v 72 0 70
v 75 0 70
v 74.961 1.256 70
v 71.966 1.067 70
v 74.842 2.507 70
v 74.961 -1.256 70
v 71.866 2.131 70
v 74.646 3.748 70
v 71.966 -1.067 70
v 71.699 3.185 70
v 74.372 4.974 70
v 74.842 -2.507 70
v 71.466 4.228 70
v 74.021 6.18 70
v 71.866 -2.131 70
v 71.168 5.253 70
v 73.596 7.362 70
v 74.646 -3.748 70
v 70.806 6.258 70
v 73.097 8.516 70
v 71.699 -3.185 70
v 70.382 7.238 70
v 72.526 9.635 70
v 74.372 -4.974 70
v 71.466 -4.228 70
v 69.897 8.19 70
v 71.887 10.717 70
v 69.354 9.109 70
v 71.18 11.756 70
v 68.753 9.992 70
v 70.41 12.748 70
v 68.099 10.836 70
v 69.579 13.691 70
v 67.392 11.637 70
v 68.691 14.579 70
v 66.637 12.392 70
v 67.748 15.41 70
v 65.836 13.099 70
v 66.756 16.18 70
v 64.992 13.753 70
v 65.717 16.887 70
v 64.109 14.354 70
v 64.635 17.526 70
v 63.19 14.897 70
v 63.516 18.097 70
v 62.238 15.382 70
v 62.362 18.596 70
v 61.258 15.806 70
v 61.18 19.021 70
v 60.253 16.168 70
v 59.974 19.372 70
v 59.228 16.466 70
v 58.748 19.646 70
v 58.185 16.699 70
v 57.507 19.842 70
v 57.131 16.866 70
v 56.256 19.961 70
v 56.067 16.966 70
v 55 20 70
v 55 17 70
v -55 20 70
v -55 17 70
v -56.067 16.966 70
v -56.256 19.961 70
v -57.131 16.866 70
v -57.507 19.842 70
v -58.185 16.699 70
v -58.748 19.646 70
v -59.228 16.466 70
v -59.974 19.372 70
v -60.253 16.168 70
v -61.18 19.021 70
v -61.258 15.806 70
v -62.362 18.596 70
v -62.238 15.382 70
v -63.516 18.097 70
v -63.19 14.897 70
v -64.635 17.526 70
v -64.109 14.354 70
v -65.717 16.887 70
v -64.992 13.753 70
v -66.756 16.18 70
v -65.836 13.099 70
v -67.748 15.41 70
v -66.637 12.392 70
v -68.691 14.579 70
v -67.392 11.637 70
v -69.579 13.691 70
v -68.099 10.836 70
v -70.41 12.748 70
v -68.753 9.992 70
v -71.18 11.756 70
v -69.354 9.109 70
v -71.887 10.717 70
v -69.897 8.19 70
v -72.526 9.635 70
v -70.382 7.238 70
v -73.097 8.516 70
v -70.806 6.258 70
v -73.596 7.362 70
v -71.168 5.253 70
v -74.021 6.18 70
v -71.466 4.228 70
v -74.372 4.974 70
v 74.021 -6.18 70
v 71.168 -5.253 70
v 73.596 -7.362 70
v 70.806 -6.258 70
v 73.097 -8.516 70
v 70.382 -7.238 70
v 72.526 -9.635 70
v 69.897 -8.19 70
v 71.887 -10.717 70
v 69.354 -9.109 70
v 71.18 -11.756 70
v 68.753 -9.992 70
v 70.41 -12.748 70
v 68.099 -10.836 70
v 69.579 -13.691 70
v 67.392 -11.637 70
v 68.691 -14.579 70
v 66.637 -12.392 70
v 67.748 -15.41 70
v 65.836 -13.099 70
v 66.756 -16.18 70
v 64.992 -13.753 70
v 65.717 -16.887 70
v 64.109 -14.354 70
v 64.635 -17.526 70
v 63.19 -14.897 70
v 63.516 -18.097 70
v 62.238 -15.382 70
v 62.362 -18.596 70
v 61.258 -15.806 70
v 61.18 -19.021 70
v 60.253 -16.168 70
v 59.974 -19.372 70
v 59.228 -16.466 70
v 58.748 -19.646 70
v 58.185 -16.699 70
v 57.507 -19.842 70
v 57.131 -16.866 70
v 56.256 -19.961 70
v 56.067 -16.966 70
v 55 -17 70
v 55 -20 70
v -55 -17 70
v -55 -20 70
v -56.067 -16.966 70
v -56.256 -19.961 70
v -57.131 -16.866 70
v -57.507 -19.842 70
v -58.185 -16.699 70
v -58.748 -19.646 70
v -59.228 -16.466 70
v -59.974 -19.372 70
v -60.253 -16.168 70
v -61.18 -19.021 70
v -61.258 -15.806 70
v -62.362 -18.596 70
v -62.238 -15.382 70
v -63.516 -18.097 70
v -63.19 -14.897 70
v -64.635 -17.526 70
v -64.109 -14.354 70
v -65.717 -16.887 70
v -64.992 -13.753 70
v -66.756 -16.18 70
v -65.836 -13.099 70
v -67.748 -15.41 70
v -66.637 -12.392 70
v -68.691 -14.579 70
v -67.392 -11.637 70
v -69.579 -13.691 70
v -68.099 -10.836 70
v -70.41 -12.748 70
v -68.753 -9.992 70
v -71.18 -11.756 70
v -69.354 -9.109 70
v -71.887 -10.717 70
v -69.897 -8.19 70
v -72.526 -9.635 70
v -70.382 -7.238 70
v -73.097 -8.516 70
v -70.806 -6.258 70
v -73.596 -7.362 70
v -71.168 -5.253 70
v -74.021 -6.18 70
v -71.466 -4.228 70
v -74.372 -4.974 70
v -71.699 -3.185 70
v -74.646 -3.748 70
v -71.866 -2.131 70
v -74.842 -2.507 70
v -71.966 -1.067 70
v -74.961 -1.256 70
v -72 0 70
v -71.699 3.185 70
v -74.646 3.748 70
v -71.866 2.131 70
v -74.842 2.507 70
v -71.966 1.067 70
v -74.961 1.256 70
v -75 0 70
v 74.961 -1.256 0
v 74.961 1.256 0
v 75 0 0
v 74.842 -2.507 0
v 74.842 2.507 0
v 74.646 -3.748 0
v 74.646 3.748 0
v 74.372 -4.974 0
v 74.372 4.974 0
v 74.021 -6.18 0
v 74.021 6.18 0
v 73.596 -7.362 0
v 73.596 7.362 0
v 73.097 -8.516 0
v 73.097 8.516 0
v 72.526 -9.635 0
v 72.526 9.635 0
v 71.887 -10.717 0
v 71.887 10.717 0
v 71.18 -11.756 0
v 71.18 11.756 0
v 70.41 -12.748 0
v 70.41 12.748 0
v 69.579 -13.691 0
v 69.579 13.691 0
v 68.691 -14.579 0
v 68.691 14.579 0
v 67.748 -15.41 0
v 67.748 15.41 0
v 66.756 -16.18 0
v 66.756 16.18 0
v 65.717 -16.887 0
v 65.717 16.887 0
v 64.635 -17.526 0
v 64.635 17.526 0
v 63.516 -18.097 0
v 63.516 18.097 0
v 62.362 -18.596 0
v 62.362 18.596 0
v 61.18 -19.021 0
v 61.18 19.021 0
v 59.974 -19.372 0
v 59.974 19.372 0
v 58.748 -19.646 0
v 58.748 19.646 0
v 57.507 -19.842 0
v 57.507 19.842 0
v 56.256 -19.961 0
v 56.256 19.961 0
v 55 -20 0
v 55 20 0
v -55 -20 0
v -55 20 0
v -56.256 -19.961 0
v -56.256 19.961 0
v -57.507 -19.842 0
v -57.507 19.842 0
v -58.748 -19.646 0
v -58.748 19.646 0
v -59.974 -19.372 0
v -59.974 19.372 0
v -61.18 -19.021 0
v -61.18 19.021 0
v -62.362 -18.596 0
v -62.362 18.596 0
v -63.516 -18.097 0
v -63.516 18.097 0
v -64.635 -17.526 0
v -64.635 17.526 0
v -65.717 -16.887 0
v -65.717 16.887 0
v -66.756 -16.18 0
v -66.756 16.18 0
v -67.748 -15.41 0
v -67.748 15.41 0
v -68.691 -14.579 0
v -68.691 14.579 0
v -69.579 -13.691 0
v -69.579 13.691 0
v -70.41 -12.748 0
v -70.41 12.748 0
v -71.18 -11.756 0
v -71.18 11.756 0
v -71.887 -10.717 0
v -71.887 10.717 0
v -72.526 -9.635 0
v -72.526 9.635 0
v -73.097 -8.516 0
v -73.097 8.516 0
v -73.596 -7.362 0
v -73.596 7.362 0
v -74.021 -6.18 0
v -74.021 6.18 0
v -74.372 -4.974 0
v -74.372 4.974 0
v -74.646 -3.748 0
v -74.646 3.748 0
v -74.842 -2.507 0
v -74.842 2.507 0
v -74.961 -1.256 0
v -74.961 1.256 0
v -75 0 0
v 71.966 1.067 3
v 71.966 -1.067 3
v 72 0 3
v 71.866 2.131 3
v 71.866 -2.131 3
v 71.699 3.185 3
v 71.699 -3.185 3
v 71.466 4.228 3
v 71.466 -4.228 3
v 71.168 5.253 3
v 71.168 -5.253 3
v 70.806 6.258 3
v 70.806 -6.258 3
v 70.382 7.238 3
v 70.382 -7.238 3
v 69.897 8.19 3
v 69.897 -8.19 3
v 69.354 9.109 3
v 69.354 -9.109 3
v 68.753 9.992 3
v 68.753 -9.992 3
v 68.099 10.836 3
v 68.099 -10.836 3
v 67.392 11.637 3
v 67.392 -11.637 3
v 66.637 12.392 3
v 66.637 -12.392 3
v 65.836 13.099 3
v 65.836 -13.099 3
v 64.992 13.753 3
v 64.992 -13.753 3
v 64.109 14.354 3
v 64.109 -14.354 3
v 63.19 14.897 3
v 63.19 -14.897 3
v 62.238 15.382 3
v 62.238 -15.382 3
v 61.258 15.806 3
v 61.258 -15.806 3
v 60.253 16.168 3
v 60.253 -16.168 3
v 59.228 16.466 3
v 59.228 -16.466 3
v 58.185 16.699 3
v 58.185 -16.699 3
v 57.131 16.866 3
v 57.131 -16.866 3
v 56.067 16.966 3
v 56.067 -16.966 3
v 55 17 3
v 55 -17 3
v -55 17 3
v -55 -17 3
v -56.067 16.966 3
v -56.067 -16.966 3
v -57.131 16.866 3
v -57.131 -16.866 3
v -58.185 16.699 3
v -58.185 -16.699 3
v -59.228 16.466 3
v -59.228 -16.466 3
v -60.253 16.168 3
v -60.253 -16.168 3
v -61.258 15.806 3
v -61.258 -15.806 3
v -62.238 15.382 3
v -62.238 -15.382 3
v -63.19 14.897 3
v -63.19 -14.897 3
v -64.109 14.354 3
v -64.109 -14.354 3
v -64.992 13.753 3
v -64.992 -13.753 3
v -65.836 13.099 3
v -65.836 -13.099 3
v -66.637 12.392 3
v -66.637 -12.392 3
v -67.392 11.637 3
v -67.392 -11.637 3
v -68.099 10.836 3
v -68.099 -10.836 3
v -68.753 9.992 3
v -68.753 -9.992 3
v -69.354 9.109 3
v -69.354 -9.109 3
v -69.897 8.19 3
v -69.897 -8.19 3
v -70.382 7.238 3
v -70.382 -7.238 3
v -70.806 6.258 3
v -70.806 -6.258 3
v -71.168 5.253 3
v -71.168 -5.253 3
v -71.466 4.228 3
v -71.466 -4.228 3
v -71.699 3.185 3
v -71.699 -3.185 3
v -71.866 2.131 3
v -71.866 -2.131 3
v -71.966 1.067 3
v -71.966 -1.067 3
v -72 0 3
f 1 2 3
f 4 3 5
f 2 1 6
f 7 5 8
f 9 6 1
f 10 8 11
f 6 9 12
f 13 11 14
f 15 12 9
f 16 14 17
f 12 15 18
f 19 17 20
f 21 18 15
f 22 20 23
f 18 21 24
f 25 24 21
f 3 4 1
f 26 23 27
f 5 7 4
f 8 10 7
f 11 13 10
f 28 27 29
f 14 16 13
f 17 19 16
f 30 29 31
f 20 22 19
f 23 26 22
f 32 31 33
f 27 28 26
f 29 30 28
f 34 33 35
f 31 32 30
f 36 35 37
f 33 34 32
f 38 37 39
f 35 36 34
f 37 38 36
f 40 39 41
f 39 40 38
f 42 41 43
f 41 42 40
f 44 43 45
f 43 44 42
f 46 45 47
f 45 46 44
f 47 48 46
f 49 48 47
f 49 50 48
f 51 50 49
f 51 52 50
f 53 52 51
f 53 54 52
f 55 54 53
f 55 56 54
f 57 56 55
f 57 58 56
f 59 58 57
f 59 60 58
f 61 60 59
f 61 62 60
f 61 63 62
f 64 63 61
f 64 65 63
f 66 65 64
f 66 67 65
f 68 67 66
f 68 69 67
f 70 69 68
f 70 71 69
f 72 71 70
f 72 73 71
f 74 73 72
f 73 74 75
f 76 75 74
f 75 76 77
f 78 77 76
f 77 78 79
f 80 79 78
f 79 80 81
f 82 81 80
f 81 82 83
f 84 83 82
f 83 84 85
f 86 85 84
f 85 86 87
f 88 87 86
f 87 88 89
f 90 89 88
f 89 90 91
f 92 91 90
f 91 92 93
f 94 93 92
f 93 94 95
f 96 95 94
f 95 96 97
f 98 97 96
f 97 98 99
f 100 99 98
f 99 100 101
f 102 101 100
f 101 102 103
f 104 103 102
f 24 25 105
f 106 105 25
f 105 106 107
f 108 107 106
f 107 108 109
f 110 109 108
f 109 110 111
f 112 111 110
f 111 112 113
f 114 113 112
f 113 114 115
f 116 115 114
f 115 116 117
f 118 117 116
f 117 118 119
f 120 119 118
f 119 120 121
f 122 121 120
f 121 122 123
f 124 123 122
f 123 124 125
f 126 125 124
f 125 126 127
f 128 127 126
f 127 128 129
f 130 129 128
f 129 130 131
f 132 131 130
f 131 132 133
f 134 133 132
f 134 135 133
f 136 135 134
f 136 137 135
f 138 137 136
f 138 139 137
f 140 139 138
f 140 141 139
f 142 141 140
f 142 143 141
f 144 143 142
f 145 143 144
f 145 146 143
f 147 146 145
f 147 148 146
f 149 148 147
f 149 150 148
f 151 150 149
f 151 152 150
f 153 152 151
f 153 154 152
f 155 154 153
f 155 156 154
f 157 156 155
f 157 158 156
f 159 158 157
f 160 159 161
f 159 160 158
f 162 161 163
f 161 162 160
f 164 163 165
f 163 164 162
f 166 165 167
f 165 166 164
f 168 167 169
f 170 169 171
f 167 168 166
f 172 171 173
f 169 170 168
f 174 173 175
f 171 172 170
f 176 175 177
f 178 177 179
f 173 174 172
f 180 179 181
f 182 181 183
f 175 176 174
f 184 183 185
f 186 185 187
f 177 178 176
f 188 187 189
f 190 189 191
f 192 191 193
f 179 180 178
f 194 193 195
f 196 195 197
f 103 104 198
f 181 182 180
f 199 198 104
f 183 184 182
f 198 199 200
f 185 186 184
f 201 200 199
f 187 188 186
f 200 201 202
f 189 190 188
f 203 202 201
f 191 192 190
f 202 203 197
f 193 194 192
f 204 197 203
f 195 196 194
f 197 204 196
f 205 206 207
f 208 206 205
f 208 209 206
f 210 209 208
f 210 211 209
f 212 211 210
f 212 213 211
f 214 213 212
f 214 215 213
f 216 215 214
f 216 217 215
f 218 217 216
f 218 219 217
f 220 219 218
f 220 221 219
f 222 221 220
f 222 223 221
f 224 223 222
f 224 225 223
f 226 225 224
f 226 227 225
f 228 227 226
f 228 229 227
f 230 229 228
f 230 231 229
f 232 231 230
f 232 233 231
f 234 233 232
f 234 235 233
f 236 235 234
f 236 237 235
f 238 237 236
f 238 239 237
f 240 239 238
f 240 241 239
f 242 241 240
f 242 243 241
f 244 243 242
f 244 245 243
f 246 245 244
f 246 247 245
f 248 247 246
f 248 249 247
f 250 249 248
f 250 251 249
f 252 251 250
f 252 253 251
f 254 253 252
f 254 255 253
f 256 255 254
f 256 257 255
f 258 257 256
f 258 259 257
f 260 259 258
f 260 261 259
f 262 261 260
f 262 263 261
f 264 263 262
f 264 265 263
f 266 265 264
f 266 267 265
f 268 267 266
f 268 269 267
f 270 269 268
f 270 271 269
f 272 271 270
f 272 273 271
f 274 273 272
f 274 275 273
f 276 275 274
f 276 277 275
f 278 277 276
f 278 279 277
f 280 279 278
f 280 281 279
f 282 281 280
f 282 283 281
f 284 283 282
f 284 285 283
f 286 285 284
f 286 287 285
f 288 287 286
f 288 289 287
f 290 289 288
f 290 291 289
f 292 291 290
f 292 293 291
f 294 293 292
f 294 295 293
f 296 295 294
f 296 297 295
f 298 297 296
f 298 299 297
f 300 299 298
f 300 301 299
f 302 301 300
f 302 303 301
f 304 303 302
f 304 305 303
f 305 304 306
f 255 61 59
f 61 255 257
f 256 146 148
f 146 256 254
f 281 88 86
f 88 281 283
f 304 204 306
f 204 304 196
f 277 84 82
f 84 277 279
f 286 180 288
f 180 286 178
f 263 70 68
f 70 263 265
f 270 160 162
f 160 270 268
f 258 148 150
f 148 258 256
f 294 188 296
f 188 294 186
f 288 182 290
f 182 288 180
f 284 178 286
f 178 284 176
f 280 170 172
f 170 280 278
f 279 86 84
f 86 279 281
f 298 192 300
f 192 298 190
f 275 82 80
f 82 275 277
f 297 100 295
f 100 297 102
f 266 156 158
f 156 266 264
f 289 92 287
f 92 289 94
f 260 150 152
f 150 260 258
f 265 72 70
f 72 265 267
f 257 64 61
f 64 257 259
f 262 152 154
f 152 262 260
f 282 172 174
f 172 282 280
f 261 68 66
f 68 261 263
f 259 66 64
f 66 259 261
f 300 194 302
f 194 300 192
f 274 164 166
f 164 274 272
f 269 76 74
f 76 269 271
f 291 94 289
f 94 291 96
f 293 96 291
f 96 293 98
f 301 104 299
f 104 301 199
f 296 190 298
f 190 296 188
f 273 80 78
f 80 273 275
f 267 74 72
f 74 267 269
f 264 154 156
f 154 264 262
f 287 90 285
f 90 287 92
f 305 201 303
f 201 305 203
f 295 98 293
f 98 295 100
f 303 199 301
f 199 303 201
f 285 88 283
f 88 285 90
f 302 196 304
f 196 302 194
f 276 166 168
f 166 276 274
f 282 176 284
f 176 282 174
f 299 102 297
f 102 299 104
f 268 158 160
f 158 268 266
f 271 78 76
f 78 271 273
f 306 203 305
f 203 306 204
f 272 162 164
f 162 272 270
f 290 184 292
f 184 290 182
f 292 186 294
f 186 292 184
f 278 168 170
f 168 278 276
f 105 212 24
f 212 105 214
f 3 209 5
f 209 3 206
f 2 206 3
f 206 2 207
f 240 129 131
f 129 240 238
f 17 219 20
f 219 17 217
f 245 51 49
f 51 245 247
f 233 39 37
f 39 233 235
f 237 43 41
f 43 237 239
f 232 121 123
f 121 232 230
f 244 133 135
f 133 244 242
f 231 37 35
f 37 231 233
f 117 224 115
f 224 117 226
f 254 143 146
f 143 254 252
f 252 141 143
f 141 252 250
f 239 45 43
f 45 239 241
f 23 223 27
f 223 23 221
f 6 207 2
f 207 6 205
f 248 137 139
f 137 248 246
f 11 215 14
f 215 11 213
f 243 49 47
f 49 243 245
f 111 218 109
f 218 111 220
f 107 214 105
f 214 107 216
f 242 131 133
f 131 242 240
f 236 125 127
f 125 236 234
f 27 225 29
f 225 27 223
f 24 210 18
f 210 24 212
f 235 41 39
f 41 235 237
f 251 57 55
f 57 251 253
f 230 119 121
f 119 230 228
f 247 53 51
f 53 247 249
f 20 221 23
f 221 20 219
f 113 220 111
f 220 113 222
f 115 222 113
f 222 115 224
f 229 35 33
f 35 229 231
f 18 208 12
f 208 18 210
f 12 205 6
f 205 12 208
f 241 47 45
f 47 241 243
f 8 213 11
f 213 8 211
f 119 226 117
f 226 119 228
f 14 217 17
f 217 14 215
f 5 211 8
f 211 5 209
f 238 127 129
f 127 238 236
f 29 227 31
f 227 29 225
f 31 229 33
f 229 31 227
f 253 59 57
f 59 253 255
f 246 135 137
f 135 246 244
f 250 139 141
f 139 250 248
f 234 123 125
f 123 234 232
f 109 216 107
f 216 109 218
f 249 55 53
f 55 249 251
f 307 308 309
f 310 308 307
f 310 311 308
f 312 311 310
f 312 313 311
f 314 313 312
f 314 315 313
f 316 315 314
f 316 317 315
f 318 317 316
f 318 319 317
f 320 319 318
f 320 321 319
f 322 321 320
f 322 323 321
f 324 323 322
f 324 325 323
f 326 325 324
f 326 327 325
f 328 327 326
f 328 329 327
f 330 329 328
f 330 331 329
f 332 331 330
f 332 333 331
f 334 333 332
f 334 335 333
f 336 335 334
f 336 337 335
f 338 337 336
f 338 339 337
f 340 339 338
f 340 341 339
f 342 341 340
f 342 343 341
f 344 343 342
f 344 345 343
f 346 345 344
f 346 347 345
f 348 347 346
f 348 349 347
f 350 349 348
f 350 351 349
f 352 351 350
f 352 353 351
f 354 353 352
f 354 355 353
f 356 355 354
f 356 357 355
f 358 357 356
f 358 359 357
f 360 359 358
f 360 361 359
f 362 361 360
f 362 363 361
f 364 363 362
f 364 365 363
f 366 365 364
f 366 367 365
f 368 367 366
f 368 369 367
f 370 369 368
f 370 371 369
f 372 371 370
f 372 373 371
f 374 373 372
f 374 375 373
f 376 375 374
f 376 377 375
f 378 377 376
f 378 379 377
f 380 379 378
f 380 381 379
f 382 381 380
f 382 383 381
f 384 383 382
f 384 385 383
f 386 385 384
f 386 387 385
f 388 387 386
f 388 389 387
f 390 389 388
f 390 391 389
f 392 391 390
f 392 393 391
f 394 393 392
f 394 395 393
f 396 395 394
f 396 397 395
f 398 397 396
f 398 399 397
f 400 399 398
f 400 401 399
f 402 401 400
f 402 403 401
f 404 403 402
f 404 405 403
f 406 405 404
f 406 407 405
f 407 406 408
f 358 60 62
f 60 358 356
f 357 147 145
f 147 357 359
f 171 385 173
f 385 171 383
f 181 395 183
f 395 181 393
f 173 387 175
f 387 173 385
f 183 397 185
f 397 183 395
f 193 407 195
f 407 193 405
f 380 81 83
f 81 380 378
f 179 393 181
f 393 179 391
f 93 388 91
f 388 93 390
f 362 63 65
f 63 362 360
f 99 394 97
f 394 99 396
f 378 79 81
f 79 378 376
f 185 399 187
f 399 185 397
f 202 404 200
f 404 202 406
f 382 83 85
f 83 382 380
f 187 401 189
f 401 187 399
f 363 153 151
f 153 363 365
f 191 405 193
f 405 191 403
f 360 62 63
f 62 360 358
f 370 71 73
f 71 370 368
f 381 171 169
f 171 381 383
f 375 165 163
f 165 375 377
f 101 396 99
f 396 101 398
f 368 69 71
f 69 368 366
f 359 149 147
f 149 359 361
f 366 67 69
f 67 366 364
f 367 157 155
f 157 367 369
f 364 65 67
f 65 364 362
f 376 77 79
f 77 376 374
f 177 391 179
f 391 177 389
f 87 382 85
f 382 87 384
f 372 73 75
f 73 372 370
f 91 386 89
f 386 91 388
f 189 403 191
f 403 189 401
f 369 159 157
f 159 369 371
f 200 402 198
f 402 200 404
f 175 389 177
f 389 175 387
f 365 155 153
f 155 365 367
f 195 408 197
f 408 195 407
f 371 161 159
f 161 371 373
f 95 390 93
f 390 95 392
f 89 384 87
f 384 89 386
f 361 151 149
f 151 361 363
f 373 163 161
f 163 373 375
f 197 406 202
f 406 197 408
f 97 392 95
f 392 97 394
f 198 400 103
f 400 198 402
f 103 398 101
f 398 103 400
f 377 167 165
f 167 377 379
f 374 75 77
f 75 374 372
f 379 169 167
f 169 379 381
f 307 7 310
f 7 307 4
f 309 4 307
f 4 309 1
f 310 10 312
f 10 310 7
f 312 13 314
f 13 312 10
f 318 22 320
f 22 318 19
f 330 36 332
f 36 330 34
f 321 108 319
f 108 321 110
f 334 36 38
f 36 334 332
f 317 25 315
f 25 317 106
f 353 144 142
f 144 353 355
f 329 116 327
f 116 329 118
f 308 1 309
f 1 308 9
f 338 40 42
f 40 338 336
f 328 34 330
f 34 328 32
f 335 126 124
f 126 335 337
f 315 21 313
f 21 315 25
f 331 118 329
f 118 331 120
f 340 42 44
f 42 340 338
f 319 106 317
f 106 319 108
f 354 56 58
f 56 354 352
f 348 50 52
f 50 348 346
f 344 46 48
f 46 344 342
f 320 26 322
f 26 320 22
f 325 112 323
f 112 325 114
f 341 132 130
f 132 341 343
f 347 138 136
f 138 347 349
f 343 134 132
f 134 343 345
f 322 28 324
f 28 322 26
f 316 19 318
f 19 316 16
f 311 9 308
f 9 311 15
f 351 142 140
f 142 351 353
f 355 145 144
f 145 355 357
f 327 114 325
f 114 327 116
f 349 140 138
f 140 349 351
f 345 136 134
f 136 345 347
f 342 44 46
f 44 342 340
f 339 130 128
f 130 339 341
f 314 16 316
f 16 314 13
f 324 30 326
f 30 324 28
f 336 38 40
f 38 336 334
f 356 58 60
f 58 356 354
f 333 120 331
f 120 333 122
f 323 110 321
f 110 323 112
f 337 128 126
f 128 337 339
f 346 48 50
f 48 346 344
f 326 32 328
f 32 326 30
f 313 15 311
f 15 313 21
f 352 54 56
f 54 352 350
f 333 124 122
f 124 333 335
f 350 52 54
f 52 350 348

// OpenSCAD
// [FL_INDEX: keywords="openscad, 3d_parametric, Parametric_Pot, csg_solid" | COT="Parametric OpenSCAD design from 3DCodeverse"]
// Title: Parametric Pot

//Length
L=150;
//Depth
D=40;
//Height
H=70;
//Thickness
t=3;

vase(L=L,D=D,H=H,t=t);

module langloch(L=150,D=40,H=70)
{
  translate(v=[0,0,H/2]) {
    cube(size=[L-D,D,H],center=true);
  }
  translate(v=[-L/2+D/2,0,0]) {
    cylinder(h=H,r=D/2,$fn=100);
  }
  translate(v=[L/2-D/2,0,0]) {
    cylinder(h=H,r=D/2,$fn=100);
  }
}

module vase(L=150,D=40,H=70,t=3)
{
  difference() {
    langloch(L=L,D=D,H=H);
    translate(v=[0,0,t]) {
      langloch(L=L-t-t,D=D-t-t,H=H);
    }
  }
}

// -- (c) 2013 Abdreas Urben (urbenan) 
// -- GPL license
